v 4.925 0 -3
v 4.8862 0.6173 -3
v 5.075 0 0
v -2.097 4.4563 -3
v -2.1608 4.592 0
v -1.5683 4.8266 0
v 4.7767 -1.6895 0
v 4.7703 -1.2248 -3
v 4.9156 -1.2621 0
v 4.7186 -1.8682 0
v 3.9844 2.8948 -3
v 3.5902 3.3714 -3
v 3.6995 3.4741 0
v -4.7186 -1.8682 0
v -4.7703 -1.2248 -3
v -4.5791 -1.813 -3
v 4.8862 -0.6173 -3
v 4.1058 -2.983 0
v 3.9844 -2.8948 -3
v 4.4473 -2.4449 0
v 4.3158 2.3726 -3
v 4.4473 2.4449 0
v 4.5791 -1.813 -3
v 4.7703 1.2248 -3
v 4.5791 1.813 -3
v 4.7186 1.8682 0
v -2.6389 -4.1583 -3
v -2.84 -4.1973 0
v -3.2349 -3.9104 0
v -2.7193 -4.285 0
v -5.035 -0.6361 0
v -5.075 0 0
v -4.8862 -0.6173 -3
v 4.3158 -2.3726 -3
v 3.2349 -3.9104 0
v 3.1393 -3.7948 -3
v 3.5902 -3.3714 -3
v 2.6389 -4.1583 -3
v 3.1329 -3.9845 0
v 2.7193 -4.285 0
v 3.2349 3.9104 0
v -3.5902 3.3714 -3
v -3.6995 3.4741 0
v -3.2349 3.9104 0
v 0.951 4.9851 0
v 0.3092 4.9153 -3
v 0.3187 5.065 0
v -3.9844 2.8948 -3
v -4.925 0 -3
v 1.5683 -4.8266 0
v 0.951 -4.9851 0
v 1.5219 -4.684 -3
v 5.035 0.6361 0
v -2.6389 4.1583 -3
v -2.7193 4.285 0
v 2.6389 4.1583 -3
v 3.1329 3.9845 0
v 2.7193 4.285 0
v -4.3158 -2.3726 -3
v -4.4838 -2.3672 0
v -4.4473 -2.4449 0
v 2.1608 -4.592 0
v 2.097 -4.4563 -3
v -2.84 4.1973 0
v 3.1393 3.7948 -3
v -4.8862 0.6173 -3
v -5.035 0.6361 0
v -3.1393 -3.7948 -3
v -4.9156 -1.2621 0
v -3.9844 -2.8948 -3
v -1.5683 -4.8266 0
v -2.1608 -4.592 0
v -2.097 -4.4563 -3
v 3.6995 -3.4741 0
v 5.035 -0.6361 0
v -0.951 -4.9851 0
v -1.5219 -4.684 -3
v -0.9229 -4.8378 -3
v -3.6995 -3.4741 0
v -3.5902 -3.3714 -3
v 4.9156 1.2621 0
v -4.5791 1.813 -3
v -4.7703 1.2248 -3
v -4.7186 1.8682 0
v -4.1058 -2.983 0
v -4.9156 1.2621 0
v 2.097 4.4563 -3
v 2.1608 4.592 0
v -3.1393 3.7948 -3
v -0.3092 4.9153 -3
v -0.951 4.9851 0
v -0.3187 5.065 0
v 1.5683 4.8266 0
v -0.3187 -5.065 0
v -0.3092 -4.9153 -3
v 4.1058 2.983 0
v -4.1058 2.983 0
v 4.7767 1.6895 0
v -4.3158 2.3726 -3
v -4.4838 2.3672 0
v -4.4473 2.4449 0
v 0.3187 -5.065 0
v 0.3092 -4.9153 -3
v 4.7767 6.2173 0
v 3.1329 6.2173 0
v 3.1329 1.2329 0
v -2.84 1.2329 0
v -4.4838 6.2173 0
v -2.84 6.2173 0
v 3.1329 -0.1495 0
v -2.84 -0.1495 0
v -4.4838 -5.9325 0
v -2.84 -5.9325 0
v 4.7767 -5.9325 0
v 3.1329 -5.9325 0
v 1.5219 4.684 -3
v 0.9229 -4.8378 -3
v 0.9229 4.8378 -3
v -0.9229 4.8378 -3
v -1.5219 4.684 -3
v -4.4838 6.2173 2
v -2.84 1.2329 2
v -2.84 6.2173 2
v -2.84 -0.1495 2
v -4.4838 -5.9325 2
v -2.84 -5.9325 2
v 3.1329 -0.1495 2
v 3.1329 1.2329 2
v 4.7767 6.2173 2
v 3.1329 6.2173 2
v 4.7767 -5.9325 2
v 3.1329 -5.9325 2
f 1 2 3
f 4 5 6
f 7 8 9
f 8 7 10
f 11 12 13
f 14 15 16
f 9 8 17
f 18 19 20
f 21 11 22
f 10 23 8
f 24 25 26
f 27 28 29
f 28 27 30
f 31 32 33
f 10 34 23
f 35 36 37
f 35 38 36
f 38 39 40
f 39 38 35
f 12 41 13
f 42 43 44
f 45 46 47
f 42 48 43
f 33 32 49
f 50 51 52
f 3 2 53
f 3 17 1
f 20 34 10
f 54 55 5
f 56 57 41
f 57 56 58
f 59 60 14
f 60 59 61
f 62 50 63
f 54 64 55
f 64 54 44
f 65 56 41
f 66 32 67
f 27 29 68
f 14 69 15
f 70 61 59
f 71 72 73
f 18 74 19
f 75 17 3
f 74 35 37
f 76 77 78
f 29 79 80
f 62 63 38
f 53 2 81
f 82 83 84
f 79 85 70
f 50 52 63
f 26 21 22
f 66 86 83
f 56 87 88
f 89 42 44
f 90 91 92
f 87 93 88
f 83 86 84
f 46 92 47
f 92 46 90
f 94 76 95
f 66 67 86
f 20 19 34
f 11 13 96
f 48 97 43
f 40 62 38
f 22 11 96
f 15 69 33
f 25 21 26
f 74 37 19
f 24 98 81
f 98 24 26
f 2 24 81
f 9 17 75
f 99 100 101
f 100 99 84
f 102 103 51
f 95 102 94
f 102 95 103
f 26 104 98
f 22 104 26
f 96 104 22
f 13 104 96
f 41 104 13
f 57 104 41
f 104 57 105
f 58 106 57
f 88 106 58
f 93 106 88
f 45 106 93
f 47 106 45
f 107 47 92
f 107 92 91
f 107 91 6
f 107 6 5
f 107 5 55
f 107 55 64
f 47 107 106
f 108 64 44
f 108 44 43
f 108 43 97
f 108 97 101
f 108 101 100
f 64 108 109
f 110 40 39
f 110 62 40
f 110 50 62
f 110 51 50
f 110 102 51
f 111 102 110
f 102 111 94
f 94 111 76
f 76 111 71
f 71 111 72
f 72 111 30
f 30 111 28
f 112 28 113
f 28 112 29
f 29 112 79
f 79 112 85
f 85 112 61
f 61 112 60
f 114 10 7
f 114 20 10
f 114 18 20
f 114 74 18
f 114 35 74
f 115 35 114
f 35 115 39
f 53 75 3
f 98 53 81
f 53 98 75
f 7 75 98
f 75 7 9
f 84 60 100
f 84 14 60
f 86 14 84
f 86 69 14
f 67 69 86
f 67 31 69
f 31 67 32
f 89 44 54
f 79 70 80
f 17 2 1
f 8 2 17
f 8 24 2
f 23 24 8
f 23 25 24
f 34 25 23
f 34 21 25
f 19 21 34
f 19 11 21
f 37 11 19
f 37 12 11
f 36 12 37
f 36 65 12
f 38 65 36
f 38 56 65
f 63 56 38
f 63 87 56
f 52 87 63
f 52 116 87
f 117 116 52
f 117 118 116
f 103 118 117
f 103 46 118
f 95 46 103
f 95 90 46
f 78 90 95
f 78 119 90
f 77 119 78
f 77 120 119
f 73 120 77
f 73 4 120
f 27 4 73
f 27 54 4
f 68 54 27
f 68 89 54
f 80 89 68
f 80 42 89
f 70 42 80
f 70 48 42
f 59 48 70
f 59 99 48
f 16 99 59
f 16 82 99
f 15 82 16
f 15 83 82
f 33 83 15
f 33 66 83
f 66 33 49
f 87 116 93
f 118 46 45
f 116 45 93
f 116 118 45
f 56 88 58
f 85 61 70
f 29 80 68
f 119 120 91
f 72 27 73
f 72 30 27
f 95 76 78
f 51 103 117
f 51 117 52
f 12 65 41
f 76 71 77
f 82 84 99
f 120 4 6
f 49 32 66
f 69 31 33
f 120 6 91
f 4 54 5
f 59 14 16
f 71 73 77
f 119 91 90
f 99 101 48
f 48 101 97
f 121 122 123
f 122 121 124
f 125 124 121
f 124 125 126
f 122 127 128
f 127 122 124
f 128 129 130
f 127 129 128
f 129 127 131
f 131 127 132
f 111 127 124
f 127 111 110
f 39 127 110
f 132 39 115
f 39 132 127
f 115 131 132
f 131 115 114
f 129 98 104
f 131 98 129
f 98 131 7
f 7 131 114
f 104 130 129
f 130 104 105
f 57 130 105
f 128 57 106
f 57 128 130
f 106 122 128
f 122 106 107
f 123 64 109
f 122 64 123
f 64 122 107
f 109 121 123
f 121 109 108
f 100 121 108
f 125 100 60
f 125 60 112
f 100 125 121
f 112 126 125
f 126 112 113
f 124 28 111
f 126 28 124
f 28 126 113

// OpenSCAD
$fn = 50;


difference() {
	union() {
		translate(v = [0, 0, -3.0000000000]) {
			cylinder(h = 3, r1 = 4.9250000000, r2 = 5.0750000000);
		}
		linear_extrude(height = 2) {
			text(font = "Impact", halign = "center", size = 12, text = "H", valign = "center");
		}
	}
	union();
}
